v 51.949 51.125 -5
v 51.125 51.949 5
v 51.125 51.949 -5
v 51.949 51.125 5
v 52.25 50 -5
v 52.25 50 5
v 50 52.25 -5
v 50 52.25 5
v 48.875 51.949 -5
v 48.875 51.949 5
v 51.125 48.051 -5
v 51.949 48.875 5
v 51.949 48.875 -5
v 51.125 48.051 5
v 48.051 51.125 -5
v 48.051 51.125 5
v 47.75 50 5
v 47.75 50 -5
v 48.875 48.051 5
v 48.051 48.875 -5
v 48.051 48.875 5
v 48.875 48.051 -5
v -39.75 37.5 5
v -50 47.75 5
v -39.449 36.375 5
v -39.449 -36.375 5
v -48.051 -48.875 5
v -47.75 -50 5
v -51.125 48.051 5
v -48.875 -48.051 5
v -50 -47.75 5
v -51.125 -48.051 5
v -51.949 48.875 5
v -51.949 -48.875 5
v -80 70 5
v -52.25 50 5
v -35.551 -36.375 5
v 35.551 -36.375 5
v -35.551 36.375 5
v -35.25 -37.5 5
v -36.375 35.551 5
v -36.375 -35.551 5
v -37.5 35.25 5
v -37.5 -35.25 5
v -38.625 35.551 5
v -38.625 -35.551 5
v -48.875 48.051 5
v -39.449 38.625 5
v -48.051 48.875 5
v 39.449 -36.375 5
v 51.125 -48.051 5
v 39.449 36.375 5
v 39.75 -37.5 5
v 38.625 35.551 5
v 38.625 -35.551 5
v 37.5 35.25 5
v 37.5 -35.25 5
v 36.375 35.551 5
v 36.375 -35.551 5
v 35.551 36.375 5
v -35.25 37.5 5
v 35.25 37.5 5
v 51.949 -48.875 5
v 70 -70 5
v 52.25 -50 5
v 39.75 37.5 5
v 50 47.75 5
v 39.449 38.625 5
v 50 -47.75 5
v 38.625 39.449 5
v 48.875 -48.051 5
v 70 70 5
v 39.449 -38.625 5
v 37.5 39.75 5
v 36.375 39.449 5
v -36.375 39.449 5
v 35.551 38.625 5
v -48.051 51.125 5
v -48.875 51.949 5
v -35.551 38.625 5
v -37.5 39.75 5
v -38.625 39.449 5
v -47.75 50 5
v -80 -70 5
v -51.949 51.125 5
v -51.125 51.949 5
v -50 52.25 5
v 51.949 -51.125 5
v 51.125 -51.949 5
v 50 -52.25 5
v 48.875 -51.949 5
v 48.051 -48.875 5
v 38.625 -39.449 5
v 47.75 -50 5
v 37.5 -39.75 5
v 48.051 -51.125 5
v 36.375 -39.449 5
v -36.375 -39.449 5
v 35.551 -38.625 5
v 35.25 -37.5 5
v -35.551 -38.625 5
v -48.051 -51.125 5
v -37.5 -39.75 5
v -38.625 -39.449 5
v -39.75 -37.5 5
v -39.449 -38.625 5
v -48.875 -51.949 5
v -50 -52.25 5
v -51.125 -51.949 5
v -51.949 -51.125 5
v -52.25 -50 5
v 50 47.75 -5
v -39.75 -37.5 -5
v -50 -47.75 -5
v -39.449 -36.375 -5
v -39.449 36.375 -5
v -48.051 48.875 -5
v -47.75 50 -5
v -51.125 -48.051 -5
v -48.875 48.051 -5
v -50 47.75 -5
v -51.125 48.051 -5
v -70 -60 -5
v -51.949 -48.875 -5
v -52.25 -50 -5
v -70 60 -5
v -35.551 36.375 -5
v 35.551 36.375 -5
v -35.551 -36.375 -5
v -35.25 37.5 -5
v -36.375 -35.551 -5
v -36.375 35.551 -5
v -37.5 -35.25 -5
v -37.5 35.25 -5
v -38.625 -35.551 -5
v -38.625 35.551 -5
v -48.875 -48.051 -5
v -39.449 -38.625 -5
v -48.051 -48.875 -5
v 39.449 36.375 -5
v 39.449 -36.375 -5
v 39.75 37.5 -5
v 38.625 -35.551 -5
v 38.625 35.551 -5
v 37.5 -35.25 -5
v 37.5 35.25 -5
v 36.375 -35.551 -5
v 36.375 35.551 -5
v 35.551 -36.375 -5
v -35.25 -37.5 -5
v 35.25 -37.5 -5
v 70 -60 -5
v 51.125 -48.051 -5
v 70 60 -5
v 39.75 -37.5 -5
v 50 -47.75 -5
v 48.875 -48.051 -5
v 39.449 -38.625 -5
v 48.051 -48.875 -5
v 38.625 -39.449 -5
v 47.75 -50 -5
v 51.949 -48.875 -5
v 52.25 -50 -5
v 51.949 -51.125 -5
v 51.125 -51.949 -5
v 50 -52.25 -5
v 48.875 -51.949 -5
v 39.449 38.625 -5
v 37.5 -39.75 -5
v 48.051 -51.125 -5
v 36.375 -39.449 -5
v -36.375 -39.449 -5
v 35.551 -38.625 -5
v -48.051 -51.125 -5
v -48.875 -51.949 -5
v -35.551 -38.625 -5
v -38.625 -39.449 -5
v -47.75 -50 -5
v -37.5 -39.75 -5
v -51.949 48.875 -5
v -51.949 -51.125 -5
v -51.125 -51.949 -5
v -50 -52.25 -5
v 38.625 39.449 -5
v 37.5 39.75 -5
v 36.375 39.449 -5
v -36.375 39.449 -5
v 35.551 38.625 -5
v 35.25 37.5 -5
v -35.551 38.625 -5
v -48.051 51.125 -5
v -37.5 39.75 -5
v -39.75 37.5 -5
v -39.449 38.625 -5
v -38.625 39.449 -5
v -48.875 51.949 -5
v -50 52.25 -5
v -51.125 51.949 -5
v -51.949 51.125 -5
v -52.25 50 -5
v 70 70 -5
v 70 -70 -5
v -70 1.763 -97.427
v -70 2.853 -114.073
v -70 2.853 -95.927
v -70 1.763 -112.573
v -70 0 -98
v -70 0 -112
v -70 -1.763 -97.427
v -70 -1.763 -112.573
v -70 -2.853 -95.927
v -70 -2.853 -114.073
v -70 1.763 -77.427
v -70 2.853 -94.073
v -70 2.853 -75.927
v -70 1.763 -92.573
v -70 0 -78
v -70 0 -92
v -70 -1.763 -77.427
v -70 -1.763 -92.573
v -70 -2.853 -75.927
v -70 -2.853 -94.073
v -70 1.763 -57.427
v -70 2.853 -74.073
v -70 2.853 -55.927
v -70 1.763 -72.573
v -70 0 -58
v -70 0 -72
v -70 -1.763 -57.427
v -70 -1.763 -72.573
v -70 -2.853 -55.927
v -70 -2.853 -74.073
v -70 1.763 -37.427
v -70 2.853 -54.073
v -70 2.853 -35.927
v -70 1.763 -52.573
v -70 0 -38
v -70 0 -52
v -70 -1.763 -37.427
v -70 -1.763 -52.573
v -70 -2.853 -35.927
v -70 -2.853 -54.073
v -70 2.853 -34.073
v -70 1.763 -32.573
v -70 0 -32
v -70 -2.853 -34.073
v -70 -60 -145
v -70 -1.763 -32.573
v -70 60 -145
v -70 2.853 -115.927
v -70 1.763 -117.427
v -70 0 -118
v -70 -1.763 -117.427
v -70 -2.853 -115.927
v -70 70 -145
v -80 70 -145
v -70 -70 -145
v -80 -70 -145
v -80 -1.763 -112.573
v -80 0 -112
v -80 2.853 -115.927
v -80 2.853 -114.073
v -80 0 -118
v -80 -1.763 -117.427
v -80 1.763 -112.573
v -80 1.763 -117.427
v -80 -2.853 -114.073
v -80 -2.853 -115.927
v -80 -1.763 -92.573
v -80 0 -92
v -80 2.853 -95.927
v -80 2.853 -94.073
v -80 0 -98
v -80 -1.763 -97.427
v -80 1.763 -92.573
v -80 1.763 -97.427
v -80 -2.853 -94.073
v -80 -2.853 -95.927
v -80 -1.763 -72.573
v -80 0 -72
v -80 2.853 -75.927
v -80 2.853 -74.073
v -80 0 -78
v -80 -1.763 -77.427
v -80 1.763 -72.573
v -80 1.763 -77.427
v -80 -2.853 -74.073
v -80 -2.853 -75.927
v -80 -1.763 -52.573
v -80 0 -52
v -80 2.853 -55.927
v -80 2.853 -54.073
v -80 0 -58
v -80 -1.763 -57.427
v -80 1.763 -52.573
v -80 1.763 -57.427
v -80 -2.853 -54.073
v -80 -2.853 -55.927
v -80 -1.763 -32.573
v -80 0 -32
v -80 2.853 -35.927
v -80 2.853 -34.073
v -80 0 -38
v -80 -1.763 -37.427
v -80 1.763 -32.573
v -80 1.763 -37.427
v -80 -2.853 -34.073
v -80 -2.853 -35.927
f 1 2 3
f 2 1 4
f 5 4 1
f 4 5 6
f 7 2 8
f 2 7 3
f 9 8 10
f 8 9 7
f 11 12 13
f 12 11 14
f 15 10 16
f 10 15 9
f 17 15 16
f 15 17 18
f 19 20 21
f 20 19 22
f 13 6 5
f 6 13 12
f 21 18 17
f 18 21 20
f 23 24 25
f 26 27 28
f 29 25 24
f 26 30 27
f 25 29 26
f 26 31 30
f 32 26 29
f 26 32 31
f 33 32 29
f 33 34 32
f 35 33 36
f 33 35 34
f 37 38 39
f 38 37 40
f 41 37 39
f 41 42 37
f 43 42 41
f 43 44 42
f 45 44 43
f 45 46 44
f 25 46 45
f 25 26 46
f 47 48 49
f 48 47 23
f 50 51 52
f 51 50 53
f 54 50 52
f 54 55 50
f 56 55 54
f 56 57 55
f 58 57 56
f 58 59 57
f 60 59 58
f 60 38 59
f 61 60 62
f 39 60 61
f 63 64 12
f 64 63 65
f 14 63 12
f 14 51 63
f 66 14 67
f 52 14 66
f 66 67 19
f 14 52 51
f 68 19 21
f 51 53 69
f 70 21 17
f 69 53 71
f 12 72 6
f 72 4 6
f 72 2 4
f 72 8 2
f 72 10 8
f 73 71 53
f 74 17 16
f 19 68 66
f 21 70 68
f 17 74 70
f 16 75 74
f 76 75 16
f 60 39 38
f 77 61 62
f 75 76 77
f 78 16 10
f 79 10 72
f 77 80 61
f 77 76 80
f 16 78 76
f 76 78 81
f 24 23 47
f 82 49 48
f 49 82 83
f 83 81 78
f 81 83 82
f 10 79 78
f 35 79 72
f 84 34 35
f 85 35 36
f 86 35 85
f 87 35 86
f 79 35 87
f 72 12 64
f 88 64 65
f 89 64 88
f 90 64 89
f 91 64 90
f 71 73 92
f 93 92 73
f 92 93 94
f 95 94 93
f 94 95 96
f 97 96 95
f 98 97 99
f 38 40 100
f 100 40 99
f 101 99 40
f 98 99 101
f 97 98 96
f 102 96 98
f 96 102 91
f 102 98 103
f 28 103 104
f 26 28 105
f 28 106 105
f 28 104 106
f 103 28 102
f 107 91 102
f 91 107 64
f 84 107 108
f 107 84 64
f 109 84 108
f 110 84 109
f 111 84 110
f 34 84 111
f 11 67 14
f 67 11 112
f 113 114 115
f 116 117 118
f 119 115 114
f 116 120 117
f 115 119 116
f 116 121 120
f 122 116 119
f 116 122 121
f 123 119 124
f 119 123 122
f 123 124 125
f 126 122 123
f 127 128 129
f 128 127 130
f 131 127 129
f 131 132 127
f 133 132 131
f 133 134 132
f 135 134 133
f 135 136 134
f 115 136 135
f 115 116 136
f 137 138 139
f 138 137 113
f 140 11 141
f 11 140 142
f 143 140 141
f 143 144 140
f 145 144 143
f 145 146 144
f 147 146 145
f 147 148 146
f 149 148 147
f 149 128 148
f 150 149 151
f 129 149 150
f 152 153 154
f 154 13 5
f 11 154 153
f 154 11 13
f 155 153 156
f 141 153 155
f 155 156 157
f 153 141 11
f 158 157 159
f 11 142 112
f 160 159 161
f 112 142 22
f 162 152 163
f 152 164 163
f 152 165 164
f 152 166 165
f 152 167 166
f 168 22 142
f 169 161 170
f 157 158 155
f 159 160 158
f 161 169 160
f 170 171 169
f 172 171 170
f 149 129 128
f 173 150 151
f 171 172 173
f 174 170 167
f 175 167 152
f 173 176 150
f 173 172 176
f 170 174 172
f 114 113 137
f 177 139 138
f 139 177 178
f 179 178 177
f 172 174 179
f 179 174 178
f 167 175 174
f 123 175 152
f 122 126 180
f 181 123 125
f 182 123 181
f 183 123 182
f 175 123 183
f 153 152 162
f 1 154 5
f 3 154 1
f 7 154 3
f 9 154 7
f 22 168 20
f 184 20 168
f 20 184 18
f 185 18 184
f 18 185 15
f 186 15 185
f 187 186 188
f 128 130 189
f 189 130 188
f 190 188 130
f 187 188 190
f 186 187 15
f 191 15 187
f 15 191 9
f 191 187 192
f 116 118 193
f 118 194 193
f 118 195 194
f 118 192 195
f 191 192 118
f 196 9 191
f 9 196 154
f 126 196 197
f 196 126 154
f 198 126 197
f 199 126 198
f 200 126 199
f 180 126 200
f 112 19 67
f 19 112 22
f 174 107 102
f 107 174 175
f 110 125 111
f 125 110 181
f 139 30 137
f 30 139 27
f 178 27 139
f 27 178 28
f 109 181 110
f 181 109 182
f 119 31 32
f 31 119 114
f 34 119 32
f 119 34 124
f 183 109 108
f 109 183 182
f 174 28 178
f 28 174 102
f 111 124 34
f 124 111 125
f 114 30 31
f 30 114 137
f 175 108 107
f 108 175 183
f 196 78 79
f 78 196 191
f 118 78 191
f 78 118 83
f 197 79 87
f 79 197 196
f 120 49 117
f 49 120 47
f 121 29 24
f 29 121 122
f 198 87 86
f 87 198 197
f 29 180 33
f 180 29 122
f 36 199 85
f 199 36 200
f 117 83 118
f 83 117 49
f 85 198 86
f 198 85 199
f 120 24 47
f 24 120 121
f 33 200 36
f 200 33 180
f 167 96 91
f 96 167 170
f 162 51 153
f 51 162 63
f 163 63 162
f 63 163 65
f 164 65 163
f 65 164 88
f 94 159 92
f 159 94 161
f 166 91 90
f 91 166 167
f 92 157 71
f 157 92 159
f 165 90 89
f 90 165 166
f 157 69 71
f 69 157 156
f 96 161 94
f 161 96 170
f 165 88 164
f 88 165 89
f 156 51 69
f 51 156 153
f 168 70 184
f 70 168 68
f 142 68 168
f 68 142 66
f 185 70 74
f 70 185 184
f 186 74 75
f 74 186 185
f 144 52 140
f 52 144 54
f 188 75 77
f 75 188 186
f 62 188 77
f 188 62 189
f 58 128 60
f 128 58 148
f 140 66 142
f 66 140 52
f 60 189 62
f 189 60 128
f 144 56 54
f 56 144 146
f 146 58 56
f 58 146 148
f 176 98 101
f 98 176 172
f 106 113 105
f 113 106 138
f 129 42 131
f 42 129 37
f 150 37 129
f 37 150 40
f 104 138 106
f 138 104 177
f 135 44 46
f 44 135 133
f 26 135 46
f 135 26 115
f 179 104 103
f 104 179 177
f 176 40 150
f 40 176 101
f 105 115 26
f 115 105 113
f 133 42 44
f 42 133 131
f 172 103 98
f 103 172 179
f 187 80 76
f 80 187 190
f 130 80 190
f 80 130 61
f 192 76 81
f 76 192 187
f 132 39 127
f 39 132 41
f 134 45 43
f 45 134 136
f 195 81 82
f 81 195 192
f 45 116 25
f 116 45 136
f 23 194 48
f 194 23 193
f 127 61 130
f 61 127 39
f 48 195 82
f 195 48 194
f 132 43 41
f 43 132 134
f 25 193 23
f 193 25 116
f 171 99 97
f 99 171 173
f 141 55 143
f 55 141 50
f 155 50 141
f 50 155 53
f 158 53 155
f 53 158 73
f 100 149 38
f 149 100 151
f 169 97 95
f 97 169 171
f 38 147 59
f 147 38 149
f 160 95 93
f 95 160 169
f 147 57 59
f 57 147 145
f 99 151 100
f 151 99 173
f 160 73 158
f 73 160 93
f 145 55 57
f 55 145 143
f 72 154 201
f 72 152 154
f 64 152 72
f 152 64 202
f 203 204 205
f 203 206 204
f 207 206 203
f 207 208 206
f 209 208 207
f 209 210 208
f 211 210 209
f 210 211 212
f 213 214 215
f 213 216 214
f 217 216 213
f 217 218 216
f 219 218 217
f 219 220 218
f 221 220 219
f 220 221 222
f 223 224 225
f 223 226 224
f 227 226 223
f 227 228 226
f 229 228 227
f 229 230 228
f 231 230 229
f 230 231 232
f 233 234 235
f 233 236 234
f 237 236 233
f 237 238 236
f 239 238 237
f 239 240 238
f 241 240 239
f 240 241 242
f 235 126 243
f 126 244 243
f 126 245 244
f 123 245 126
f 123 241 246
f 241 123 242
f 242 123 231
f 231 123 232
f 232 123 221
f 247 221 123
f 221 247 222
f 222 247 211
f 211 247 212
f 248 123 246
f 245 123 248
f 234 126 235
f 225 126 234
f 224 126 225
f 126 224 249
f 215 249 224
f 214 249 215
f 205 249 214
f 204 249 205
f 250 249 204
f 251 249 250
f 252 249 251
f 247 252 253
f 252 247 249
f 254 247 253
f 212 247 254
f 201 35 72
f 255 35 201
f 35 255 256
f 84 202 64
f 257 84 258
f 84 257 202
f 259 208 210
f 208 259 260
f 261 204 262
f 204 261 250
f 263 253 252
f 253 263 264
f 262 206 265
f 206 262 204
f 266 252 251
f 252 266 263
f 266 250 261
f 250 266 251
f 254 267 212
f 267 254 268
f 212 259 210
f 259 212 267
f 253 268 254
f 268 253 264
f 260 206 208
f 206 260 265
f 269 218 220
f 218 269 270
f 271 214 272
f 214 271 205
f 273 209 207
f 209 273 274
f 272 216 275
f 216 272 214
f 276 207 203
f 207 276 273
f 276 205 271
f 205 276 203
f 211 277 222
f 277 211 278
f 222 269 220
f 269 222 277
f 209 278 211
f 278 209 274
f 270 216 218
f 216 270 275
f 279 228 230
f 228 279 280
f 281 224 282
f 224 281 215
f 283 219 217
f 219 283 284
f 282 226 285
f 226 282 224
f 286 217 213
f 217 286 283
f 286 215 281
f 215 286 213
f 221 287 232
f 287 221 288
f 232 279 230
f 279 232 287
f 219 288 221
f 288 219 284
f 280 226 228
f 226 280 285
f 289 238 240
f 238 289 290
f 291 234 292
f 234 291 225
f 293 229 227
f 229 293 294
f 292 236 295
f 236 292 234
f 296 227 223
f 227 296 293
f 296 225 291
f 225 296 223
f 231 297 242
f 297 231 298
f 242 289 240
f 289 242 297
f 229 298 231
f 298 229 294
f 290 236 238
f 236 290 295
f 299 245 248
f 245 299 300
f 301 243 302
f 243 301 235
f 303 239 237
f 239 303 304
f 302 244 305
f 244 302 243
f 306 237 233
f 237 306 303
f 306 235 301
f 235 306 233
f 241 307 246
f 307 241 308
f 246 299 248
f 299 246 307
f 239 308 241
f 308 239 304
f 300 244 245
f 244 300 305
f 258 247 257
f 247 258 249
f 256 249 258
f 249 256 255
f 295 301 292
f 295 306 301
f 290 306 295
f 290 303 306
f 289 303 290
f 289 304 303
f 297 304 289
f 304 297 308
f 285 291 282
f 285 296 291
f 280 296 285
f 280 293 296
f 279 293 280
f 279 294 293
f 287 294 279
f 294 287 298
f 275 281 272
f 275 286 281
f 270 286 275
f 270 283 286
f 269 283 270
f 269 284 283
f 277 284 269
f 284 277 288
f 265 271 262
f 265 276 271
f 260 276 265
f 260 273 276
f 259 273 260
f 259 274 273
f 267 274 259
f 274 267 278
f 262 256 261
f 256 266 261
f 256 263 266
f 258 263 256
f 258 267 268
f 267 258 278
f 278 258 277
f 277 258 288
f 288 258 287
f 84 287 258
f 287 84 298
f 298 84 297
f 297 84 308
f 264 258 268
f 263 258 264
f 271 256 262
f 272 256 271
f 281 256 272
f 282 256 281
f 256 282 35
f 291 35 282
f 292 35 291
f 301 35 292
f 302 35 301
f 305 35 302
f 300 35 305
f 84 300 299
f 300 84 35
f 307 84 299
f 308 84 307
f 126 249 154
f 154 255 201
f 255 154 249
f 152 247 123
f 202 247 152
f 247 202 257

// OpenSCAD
// Vesa 100mm to 75mm adapter


plate_edge = 140;
plate_height = 10;
vesa_a = 100;
vesa_b = 75;

hole_a = 5.5;
hole_b = 4.5;

nut_h = 5;
nut_d = 9.5;

head_d = 10;
head_h = 5;



module plate() {
    cube([plate_edge,plate_edge,plate_height], center=true);
}

module vesa_hole_a() {
    cylinder(d=hole_a, h=plate_height, center=true, $fn=12);
    translate([0, 0, 0.5*(plate_height-nut_h)]) cylinder(d=nut_d, h=nut_h, center=true, $fn=6);
}

module vesa_hole_b() {
    cylinder(d=hole_b, h=plate_height, center=true, $fn=12);
    //translate([0, 0, -0.5*(plate_height-head_h)]) cylinder(d=head_d, h=head_h, center=true, $fn=12); 
}
module vesa_a_holes_() {
  off = 0.5 * vesa_a;
  translate([off, off, 0]) vesa_hole_a();
  translate([-off, -off, 0]) vesa_hole_a();
  translate([-off, off, 0]) vesa_hole_a();
  translate([off, -off, 0]) vesa_hole_a();
}
module vesa_b_holes() {
  off = 0.5 * vesa_b;
  translate([off, off, 0]) vesa_hole_b();
  translate([-off, -off, 0]) vesa_hole_b();
  translate([-off, off, 0]) vesa_hole_b();
  translate([off, -off, 0]) vesa_hole_b();
}

module vesa_a_holes() {
  off = 0.5 * vesa_a;
  translate([off, off, 0]) vesa_hole_b();
  translate([-off, -off, 0]) vesa_hole_b();
  translate([-off, off, 0]) vesa_hole_b();
  translate([off, -off, 0]) vesa_hole_b();
}

module bottom_plate() {
 difference() {
   cube([plate_height, plate_edge, plate_edge+plate_height]);
   for(i = [-40, -20, 0, 20, 40]) {
    translate([-0.5*plate_height, 0.5*plate_edge, 0.5*plate_edge+i]) rotate([0, 90, 0]) 
    cylinder(h=2*plate_height, d=6);
   }
     
 }

}

difference() 
{
  plate();
  vesa_a_holes();
  vesa_b_holes();
}

x = plate_edge;

translate([-0.5*x-plate_height, -0.5*x ,-x-0.5*plate_height])
bottom_plate();


translate([-0.5*x, 0.5*x-plate_height, -0.5*plate_height]) rotate([-90, 0, 0]) 
  linear_extrude(plate_height) polygon([[0,0],[0,x],[x,0]]);

translate([-0.5*x, -0.5*x, -0.5*plate_height]) rotate([-90, 0, 0]) 
  linear_extrude(plate_height) polygon([[0,0],[0,x],[x,0]]);
